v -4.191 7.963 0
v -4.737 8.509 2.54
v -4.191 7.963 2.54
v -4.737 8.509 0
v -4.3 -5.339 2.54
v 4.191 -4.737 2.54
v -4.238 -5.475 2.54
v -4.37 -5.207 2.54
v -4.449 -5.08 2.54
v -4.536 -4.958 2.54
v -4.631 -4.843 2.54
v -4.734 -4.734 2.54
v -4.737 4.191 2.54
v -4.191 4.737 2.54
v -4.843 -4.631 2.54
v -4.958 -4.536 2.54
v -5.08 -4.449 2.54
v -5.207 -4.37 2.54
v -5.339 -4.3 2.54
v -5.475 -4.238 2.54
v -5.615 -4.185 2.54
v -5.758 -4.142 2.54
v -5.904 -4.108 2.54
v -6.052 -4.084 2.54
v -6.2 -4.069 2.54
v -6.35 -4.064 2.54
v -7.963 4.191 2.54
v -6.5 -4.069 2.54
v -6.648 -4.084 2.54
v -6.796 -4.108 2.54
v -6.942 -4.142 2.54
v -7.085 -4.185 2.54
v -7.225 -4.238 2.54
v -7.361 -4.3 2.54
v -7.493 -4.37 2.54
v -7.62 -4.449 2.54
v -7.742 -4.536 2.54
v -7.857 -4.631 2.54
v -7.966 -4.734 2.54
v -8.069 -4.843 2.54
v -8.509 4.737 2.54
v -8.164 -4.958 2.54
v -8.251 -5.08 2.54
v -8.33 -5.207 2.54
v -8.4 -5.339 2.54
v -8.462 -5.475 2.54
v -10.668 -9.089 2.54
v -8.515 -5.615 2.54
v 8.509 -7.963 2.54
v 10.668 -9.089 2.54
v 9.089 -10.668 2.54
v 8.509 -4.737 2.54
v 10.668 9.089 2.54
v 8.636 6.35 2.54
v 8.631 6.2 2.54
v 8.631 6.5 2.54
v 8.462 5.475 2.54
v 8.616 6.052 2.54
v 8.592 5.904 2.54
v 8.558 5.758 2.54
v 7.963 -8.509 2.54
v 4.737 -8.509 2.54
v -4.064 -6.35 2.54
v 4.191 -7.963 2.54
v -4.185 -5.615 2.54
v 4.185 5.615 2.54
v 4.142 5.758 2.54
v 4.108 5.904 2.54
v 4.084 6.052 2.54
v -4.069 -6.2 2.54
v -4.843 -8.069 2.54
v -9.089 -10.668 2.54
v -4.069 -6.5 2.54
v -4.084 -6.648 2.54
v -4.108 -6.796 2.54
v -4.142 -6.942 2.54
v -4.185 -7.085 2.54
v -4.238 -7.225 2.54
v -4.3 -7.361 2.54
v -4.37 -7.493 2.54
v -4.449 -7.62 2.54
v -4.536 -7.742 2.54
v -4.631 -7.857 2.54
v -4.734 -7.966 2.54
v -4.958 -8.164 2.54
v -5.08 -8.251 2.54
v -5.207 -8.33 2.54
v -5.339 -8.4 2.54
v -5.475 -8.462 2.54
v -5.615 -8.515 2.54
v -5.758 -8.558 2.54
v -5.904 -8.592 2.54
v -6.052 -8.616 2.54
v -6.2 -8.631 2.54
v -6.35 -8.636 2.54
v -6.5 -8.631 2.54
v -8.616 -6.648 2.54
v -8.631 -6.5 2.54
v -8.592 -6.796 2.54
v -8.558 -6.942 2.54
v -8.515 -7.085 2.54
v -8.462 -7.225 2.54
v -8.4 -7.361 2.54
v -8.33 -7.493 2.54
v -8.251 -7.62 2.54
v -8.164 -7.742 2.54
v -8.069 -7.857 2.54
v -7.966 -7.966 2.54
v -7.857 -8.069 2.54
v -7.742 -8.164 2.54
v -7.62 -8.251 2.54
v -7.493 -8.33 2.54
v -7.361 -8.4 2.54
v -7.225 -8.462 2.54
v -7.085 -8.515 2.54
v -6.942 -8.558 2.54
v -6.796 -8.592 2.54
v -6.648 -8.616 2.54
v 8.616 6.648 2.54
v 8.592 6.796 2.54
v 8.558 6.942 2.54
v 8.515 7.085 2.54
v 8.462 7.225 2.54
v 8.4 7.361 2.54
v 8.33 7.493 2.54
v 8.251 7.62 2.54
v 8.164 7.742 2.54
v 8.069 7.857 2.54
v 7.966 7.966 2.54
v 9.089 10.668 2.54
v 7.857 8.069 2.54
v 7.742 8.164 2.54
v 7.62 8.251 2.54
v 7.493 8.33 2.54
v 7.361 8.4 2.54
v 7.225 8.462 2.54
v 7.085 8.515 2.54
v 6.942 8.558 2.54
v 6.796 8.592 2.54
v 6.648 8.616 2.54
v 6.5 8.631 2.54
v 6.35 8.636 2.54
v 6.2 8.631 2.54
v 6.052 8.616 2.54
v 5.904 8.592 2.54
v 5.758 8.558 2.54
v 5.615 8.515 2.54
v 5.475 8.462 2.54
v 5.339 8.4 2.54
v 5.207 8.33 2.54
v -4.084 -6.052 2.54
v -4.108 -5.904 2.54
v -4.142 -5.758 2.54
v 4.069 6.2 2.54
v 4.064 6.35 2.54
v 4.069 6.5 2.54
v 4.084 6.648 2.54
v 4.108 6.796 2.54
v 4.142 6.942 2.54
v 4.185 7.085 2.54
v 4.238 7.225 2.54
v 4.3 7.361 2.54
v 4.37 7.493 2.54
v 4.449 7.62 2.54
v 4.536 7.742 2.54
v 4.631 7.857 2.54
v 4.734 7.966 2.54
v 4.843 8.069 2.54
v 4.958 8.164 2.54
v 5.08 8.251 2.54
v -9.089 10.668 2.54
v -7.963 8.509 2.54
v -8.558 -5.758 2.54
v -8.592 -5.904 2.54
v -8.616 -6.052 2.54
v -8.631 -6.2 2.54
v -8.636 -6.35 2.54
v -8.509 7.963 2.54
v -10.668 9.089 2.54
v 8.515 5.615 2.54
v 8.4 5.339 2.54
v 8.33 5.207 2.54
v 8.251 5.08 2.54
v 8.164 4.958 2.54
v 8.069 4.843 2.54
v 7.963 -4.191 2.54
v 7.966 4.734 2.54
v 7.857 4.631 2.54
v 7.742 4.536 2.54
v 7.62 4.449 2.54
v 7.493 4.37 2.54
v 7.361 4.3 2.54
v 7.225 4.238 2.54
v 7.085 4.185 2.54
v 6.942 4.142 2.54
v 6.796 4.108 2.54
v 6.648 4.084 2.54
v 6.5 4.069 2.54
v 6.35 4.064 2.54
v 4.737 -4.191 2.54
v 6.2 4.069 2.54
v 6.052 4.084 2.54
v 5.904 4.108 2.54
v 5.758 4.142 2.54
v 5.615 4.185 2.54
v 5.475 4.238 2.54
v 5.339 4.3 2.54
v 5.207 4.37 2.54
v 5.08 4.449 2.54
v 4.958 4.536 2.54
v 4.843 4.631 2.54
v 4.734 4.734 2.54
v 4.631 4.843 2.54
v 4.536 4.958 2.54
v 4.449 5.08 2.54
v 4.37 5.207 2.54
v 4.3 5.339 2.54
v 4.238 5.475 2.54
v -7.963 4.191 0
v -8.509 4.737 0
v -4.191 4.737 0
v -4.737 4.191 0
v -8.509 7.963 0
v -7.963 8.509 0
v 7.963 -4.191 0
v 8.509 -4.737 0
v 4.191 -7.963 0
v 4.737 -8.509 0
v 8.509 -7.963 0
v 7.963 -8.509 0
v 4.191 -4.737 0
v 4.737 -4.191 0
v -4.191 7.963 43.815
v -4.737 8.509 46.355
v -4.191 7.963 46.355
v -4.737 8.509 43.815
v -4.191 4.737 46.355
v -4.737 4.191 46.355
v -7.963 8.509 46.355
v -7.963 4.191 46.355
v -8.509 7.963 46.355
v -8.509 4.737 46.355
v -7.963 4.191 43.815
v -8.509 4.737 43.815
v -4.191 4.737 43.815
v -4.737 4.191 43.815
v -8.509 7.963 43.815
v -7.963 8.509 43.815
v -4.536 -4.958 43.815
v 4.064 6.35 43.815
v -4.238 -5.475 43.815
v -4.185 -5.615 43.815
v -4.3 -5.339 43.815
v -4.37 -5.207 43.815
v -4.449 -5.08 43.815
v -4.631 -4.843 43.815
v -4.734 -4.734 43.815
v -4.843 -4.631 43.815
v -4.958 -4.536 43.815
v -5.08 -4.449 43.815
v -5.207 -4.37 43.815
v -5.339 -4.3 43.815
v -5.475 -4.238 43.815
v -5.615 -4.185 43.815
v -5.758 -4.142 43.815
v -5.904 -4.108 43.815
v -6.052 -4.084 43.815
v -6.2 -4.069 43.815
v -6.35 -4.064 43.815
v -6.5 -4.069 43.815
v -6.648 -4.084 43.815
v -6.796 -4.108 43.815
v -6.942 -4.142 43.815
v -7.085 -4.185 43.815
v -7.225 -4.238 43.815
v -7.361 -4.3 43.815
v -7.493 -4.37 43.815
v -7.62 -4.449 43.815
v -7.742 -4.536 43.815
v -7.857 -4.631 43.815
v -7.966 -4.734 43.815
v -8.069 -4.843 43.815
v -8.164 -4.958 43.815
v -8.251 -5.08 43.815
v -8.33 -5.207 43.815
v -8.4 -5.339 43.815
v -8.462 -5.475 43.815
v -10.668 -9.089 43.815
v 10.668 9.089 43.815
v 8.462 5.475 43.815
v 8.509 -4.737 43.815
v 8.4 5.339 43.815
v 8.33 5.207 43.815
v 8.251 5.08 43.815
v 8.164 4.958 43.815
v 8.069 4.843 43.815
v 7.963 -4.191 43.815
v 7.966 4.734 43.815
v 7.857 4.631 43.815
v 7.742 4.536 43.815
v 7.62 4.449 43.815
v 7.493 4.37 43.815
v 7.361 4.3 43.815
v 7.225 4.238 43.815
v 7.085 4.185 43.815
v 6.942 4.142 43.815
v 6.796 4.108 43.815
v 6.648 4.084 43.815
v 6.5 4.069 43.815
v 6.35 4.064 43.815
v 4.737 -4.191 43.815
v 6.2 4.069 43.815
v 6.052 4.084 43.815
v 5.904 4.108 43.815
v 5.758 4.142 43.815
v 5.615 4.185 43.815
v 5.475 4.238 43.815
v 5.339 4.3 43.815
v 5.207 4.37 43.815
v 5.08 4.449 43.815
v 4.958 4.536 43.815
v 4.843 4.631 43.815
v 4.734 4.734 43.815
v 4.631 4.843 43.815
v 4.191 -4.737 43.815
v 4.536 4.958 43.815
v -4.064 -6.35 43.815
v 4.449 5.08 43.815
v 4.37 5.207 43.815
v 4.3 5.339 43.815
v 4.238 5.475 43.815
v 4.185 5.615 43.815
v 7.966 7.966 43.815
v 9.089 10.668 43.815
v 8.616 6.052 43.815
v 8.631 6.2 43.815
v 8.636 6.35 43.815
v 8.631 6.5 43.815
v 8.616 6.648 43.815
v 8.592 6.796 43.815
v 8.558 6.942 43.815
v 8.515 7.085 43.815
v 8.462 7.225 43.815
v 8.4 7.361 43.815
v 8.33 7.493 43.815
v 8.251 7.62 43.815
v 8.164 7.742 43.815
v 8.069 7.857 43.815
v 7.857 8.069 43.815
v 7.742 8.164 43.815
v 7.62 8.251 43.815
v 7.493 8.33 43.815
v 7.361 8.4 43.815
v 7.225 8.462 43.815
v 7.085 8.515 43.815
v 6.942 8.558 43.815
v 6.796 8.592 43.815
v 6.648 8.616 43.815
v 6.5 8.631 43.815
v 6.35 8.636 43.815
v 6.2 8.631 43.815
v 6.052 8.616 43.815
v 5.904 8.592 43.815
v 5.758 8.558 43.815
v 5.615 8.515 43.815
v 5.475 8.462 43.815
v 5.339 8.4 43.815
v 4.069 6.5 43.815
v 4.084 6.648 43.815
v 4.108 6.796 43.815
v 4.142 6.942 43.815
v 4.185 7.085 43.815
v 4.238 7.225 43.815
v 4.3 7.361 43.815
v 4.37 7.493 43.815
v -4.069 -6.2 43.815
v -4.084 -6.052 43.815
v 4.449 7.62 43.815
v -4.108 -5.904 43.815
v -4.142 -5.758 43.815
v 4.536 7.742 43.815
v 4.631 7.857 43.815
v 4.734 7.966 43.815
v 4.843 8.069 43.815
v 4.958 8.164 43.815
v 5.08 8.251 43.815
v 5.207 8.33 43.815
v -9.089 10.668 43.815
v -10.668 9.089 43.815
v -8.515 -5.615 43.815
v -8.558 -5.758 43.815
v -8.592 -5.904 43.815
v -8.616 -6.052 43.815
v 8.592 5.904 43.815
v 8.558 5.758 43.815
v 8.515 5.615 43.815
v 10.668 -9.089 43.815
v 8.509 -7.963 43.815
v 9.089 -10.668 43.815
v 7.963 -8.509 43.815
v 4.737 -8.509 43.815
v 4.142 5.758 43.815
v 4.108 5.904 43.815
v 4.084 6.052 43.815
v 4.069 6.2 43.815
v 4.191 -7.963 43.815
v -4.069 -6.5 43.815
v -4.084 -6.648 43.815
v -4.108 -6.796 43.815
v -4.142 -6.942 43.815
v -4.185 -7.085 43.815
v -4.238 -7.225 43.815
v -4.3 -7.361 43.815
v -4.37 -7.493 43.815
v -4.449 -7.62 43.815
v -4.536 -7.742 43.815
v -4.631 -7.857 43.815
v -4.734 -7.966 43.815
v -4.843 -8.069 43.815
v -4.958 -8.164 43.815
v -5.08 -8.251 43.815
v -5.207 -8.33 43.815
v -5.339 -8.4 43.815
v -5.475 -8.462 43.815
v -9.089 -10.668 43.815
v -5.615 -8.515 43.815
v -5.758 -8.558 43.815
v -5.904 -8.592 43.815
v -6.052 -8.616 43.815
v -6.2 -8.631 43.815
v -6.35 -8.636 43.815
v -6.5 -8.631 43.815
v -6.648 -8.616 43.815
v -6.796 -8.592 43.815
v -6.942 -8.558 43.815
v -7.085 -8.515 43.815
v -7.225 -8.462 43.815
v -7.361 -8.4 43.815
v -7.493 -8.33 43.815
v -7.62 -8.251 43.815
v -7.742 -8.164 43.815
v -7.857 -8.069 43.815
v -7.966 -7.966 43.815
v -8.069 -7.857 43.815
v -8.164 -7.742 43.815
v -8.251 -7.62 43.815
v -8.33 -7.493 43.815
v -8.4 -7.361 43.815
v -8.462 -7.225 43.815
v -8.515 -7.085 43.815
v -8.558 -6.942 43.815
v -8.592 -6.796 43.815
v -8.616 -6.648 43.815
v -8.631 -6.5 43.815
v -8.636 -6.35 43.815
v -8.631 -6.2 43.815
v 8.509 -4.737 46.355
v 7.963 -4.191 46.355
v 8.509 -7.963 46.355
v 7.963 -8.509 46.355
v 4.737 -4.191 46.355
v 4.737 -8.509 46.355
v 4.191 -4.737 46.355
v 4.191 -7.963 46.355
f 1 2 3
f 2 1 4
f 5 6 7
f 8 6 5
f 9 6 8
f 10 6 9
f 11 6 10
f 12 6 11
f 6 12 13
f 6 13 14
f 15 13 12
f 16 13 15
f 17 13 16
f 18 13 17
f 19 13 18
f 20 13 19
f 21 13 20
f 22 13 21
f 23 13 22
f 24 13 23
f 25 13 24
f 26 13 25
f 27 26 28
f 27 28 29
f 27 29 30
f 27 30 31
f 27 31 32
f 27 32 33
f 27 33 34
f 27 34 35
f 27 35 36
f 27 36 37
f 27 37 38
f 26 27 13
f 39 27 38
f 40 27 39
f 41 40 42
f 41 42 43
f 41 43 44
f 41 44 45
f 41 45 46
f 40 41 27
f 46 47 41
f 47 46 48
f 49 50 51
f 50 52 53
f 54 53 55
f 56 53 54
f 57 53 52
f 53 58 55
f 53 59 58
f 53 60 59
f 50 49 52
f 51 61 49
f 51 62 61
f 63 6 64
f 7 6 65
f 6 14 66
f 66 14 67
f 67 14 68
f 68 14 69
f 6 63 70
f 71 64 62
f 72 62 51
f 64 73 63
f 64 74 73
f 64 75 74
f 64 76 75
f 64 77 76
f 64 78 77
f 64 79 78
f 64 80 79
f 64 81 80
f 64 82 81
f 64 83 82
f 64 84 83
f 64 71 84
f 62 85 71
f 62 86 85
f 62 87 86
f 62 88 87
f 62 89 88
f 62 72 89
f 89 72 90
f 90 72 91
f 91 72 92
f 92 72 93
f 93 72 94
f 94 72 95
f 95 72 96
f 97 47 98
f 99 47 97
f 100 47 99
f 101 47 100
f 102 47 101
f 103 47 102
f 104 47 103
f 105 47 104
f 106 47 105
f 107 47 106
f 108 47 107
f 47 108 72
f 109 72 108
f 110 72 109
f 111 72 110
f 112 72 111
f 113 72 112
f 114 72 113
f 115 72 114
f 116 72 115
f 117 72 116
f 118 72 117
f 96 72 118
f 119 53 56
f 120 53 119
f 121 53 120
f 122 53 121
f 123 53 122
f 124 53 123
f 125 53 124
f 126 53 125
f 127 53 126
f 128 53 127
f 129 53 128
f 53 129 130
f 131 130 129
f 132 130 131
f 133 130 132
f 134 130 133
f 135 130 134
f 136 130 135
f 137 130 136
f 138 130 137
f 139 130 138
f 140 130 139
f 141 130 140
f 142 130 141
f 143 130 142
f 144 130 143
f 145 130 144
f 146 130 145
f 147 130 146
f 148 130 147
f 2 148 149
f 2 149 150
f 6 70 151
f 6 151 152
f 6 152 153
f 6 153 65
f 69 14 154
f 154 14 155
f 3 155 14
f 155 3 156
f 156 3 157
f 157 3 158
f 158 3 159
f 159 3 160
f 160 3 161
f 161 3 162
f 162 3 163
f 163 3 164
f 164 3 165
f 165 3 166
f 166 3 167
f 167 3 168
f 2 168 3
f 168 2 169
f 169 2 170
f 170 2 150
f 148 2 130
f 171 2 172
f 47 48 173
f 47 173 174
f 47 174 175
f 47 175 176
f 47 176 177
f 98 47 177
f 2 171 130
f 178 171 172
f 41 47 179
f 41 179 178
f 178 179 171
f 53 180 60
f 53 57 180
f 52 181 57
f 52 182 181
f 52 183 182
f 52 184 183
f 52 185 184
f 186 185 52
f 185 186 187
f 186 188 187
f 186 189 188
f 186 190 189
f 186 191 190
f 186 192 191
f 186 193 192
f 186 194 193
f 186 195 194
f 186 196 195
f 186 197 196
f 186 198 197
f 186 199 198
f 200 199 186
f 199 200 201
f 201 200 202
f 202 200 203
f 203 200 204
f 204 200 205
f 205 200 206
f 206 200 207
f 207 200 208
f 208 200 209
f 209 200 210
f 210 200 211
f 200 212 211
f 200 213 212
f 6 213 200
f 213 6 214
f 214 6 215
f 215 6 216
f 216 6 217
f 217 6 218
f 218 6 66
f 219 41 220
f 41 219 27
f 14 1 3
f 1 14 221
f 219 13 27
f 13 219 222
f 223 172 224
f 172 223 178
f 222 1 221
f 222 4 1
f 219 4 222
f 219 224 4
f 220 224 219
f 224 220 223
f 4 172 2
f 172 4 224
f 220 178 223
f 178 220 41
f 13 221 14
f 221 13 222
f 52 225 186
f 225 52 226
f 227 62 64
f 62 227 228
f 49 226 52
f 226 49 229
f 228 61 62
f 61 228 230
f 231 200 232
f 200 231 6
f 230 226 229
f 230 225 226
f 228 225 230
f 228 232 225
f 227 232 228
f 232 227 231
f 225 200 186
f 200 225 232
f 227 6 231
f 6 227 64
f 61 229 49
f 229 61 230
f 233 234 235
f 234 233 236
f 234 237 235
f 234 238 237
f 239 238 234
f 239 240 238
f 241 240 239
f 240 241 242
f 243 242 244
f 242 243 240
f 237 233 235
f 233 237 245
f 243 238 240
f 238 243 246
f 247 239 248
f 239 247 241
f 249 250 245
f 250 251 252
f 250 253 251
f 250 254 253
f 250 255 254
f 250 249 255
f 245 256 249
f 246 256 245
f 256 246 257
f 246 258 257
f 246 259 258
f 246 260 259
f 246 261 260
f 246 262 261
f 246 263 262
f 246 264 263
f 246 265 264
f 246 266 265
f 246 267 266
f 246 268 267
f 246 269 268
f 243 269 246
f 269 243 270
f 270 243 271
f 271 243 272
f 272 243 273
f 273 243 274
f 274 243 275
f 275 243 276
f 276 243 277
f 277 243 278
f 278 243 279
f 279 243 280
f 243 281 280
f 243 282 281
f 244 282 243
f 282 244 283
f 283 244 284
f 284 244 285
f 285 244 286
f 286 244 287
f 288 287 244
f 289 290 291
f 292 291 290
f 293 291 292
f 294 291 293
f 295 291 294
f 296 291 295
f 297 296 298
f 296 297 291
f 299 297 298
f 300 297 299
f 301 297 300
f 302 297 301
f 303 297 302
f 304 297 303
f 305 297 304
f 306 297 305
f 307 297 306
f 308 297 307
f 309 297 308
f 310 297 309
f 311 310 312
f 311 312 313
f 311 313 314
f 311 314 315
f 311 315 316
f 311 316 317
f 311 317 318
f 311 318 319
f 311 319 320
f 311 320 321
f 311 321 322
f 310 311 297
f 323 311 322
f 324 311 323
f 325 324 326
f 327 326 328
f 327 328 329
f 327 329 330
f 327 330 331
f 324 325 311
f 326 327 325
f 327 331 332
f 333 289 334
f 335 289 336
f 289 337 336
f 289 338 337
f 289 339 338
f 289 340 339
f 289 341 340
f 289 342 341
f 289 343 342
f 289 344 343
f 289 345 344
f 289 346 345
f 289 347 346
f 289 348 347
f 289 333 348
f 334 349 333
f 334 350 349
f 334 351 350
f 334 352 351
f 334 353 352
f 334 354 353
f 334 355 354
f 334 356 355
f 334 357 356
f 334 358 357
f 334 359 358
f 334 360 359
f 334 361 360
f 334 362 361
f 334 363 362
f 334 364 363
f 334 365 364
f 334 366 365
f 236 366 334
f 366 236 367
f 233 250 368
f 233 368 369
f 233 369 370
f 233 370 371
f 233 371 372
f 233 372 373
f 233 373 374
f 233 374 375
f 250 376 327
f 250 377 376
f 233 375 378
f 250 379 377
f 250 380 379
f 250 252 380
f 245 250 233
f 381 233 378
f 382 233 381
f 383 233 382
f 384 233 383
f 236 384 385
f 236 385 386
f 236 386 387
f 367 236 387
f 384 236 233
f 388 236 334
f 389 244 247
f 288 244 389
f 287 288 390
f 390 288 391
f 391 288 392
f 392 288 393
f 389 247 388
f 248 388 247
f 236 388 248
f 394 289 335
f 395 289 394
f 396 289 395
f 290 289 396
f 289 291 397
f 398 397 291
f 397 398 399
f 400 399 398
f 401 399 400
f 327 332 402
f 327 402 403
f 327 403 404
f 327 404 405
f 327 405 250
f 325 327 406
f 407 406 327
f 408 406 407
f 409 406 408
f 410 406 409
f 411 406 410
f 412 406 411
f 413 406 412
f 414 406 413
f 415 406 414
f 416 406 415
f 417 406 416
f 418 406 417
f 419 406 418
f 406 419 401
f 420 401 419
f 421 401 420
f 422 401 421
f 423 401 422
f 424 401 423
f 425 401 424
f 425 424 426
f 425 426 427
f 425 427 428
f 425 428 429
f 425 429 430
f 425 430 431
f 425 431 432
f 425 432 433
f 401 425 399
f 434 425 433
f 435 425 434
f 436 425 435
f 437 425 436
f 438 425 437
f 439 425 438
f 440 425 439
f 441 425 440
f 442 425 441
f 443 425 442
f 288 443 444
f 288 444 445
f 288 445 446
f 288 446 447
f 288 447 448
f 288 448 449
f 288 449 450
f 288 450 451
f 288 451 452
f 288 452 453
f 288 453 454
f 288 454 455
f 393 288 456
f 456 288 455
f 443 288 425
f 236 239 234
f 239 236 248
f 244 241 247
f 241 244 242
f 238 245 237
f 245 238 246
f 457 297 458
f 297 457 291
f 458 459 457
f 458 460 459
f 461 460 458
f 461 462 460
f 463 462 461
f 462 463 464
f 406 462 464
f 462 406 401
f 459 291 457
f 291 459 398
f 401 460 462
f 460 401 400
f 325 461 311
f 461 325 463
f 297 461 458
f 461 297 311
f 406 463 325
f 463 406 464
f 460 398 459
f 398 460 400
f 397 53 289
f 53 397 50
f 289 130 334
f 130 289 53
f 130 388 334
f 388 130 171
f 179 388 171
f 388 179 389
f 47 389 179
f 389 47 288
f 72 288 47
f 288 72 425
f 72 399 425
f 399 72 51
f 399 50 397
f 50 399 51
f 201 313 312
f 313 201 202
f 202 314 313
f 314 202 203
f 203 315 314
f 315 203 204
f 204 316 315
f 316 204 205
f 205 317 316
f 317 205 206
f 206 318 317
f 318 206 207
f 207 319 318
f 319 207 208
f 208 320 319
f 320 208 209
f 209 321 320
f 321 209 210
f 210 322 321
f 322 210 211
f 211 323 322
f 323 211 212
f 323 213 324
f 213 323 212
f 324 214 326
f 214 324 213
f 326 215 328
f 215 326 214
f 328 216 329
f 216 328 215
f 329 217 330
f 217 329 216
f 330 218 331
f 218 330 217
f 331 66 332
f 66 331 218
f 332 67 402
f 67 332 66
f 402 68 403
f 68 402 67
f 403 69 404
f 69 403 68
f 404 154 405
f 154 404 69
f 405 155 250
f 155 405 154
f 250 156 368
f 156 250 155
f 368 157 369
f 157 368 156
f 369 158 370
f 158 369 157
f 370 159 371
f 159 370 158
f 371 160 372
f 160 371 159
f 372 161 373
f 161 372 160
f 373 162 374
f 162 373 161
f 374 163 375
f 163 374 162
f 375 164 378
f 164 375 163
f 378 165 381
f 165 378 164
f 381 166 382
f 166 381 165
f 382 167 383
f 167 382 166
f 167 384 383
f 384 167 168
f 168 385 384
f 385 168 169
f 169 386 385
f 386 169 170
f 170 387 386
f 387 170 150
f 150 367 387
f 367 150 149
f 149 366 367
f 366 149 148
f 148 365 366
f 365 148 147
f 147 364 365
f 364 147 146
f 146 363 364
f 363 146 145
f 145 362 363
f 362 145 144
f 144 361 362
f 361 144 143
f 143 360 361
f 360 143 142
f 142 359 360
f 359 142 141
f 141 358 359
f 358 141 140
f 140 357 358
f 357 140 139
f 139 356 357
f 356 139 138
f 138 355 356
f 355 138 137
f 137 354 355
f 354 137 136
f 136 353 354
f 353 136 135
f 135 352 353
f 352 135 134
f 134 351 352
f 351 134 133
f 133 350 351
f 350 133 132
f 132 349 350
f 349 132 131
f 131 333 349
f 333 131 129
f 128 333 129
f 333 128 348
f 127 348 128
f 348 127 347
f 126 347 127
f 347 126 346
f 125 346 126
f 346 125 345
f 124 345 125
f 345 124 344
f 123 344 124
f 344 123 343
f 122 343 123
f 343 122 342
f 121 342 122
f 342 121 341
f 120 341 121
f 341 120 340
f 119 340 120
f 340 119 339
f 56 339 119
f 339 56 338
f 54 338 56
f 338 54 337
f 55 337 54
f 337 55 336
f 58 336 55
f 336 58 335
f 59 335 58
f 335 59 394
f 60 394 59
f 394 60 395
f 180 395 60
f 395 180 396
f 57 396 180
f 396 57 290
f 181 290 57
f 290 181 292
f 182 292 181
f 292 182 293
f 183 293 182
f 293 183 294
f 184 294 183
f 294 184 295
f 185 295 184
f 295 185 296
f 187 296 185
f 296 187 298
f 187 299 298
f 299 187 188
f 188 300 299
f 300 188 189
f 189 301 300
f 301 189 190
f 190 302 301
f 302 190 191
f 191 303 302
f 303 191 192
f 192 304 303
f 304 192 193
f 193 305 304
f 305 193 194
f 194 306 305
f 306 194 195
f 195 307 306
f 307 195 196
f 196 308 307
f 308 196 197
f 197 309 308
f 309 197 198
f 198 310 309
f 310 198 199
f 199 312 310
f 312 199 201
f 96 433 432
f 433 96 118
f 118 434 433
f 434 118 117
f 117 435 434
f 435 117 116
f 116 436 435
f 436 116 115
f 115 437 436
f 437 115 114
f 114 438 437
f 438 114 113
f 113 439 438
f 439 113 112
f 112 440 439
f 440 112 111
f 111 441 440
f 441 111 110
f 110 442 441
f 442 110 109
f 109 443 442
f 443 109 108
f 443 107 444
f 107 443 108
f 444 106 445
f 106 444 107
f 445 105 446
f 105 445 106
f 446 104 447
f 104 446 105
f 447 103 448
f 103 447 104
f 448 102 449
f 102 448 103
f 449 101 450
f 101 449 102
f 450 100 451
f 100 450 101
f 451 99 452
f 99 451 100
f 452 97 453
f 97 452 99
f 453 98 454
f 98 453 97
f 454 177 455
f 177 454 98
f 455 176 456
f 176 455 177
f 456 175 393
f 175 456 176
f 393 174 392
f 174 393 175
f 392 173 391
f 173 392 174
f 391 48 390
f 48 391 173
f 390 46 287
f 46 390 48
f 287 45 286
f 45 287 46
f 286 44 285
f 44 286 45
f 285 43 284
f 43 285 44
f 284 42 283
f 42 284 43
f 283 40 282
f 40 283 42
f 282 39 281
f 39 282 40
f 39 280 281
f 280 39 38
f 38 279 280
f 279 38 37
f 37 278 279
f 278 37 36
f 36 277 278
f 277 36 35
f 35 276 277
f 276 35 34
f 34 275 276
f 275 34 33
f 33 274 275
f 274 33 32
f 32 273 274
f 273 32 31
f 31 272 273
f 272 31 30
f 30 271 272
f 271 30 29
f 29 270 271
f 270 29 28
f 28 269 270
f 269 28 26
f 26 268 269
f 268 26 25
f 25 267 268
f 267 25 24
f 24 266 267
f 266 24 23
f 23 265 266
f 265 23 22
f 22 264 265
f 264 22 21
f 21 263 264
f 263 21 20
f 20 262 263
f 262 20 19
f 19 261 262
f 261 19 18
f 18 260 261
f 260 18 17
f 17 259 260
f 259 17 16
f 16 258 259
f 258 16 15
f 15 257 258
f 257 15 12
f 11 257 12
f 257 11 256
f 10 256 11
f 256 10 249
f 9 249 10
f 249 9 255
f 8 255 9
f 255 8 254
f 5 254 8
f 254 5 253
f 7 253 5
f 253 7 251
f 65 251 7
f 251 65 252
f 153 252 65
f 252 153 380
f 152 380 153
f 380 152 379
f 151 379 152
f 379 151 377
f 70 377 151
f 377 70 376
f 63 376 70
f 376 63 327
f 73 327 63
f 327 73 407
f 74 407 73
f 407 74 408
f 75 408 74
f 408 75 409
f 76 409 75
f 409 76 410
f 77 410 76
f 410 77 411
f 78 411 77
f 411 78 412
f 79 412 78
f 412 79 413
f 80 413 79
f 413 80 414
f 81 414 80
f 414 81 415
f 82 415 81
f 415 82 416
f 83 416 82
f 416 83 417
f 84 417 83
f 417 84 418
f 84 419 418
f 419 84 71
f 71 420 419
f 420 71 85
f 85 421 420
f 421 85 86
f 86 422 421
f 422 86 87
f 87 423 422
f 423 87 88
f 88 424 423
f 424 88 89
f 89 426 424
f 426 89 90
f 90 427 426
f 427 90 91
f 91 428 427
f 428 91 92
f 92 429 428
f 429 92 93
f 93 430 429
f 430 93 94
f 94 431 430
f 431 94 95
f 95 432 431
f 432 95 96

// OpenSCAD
ViewScale = [0.0254, 0.0254, 0.0254];

module bump()
{
    linear_extrude(100)
    difference() {
    square([170, 170], center=true);
    for(ii=[45:90:315]) {
        rotate([0, 0, ii])
        translate([0, 120, 0])
        square([80, 30], center=true);
    }}
}

module bumps()
{
    translate([-250, 250, 0])
    bump();
    translate([250, -250, 0])
    bump();
}

module body()
{
    linear_extrude(1625)
    difference() {
    square([840, 840], center=true);
    for(ii=[45:90:315]) {
        rotate([0, 0, ii])
        translate([0, 600, 0])
        square([200, 100], center=true);
    }
    translate([250, 250, 0])
    circle(180/2, $fn=96);
    translate([-250, -250, 0])
    circle(180/2, $fn=96);
    }
}


module standoff()
{
    // bumps
    // linear_extrude(715)
    // main bit
    // bumps
}

scale(ViewScale)
{
//    standoff();
    bumps();
    translate([0, 0, 100])
    body();
    translate([0, 0, 1725])
    bumps();
}
